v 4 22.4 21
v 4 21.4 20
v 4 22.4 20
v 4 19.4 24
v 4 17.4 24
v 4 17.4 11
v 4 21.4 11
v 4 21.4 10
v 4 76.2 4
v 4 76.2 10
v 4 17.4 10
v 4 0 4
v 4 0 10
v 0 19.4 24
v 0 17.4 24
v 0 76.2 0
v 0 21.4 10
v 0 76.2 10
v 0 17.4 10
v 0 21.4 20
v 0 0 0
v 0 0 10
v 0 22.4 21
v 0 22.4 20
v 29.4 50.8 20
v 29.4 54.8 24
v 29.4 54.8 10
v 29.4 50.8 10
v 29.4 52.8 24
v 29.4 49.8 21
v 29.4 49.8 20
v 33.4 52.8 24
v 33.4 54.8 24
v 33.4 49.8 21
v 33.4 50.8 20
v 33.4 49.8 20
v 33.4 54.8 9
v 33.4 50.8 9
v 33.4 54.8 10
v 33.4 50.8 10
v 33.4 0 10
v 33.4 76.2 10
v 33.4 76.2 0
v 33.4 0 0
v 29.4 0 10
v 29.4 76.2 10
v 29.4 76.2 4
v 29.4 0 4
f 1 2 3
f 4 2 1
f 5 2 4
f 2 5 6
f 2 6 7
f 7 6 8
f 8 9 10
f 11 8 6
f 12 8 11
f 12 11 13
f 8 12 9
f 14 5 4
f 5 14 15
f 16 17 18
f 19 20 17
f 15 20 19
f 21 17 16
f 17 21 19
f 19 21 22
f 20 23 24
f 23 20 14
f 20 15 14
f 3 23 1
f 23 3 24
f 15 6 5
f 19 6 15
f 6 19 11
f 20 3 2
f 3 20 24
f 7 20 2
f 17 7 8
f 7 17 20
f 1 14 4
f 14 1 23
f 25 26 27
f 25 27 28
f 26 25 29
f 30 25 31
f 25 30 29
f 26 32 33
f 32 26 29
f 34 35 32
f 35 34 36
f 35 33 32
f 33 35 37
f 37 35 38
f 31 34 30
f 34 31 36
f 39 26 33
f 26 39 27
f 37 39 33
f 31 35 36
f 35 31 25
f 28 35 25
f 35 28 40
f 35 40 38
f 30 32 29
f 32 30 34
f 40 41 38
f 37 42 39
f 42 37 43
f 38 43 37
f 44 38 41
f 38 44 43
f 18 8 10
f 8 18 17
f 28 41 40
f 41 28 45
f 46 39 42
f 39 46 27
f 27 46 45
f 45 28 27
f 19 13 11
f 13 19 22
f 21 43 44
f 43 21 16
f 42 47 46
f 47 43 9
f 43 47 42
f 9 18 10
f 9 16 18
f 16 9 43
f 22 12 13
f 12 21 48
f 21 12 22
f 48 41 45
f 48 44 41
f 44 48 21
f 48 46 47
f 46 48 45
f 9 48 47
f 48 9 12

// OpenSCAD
/*

|=============o========|
|                      |
|                      |
|========o=============|


*/

slat_width = 25.4;
slat_thickness = 6;

wall_thickness = 4;
length = 25.4*3;

tooth_length = 1;
tooth_height = 2;

// Calculated

total_height = wall_thickness + slat_thickness;
total_width = 2 * wall_thickness + slat_width;

clip_height = total_height + tooth_height;

clip1x = 0;
clip2x = total_width - wall_thickness;

clip1y = (length / 2) - (total_width / 2) - wall_thickness;
clip2y = (length / 2) + (total_width / 2) - wall_thickness;


// CAD

// Clips
module clip(angle) {
  translate([wall_thickness / 2, wall_thickness / 2, 0])
  rotate([0, 0, angle])
  difference() {
    translate([-wall_thickness / 2, -wall_thickness / 2, -1])
    cube([wall_thickness, wall_thickness+tooth_length, clip_height + tooth_height + 1]);

    translate([-wall_thickness, wall_thickness / 2, -2])
    cube([wall_thickness * 2, wall_thickness * 2, total_height+2]);

    translate([0, wall_thickness/2 + tooth_length + wall_thickness*cos(45), total_height + wall_thickness*cos(45)+1])
    rotate([45, 0, 0])
    cube([wall_thickness * 2, wall_thickness * 2, wall_thickness * 40], true);

  }
}

difference() {
  union() {
  // Holder
  cube([total_width, length, total_height]);

  translate([clip1x, clip1y, total_height])
  clip(0);

  translate([clip2x, clip2y, total_height])
  clip(180);
  }
  
  translate([wall_thickness, -1, wall_thickness])
  cube([slat_width, length + 2, slat_thickness + 1]);
}
